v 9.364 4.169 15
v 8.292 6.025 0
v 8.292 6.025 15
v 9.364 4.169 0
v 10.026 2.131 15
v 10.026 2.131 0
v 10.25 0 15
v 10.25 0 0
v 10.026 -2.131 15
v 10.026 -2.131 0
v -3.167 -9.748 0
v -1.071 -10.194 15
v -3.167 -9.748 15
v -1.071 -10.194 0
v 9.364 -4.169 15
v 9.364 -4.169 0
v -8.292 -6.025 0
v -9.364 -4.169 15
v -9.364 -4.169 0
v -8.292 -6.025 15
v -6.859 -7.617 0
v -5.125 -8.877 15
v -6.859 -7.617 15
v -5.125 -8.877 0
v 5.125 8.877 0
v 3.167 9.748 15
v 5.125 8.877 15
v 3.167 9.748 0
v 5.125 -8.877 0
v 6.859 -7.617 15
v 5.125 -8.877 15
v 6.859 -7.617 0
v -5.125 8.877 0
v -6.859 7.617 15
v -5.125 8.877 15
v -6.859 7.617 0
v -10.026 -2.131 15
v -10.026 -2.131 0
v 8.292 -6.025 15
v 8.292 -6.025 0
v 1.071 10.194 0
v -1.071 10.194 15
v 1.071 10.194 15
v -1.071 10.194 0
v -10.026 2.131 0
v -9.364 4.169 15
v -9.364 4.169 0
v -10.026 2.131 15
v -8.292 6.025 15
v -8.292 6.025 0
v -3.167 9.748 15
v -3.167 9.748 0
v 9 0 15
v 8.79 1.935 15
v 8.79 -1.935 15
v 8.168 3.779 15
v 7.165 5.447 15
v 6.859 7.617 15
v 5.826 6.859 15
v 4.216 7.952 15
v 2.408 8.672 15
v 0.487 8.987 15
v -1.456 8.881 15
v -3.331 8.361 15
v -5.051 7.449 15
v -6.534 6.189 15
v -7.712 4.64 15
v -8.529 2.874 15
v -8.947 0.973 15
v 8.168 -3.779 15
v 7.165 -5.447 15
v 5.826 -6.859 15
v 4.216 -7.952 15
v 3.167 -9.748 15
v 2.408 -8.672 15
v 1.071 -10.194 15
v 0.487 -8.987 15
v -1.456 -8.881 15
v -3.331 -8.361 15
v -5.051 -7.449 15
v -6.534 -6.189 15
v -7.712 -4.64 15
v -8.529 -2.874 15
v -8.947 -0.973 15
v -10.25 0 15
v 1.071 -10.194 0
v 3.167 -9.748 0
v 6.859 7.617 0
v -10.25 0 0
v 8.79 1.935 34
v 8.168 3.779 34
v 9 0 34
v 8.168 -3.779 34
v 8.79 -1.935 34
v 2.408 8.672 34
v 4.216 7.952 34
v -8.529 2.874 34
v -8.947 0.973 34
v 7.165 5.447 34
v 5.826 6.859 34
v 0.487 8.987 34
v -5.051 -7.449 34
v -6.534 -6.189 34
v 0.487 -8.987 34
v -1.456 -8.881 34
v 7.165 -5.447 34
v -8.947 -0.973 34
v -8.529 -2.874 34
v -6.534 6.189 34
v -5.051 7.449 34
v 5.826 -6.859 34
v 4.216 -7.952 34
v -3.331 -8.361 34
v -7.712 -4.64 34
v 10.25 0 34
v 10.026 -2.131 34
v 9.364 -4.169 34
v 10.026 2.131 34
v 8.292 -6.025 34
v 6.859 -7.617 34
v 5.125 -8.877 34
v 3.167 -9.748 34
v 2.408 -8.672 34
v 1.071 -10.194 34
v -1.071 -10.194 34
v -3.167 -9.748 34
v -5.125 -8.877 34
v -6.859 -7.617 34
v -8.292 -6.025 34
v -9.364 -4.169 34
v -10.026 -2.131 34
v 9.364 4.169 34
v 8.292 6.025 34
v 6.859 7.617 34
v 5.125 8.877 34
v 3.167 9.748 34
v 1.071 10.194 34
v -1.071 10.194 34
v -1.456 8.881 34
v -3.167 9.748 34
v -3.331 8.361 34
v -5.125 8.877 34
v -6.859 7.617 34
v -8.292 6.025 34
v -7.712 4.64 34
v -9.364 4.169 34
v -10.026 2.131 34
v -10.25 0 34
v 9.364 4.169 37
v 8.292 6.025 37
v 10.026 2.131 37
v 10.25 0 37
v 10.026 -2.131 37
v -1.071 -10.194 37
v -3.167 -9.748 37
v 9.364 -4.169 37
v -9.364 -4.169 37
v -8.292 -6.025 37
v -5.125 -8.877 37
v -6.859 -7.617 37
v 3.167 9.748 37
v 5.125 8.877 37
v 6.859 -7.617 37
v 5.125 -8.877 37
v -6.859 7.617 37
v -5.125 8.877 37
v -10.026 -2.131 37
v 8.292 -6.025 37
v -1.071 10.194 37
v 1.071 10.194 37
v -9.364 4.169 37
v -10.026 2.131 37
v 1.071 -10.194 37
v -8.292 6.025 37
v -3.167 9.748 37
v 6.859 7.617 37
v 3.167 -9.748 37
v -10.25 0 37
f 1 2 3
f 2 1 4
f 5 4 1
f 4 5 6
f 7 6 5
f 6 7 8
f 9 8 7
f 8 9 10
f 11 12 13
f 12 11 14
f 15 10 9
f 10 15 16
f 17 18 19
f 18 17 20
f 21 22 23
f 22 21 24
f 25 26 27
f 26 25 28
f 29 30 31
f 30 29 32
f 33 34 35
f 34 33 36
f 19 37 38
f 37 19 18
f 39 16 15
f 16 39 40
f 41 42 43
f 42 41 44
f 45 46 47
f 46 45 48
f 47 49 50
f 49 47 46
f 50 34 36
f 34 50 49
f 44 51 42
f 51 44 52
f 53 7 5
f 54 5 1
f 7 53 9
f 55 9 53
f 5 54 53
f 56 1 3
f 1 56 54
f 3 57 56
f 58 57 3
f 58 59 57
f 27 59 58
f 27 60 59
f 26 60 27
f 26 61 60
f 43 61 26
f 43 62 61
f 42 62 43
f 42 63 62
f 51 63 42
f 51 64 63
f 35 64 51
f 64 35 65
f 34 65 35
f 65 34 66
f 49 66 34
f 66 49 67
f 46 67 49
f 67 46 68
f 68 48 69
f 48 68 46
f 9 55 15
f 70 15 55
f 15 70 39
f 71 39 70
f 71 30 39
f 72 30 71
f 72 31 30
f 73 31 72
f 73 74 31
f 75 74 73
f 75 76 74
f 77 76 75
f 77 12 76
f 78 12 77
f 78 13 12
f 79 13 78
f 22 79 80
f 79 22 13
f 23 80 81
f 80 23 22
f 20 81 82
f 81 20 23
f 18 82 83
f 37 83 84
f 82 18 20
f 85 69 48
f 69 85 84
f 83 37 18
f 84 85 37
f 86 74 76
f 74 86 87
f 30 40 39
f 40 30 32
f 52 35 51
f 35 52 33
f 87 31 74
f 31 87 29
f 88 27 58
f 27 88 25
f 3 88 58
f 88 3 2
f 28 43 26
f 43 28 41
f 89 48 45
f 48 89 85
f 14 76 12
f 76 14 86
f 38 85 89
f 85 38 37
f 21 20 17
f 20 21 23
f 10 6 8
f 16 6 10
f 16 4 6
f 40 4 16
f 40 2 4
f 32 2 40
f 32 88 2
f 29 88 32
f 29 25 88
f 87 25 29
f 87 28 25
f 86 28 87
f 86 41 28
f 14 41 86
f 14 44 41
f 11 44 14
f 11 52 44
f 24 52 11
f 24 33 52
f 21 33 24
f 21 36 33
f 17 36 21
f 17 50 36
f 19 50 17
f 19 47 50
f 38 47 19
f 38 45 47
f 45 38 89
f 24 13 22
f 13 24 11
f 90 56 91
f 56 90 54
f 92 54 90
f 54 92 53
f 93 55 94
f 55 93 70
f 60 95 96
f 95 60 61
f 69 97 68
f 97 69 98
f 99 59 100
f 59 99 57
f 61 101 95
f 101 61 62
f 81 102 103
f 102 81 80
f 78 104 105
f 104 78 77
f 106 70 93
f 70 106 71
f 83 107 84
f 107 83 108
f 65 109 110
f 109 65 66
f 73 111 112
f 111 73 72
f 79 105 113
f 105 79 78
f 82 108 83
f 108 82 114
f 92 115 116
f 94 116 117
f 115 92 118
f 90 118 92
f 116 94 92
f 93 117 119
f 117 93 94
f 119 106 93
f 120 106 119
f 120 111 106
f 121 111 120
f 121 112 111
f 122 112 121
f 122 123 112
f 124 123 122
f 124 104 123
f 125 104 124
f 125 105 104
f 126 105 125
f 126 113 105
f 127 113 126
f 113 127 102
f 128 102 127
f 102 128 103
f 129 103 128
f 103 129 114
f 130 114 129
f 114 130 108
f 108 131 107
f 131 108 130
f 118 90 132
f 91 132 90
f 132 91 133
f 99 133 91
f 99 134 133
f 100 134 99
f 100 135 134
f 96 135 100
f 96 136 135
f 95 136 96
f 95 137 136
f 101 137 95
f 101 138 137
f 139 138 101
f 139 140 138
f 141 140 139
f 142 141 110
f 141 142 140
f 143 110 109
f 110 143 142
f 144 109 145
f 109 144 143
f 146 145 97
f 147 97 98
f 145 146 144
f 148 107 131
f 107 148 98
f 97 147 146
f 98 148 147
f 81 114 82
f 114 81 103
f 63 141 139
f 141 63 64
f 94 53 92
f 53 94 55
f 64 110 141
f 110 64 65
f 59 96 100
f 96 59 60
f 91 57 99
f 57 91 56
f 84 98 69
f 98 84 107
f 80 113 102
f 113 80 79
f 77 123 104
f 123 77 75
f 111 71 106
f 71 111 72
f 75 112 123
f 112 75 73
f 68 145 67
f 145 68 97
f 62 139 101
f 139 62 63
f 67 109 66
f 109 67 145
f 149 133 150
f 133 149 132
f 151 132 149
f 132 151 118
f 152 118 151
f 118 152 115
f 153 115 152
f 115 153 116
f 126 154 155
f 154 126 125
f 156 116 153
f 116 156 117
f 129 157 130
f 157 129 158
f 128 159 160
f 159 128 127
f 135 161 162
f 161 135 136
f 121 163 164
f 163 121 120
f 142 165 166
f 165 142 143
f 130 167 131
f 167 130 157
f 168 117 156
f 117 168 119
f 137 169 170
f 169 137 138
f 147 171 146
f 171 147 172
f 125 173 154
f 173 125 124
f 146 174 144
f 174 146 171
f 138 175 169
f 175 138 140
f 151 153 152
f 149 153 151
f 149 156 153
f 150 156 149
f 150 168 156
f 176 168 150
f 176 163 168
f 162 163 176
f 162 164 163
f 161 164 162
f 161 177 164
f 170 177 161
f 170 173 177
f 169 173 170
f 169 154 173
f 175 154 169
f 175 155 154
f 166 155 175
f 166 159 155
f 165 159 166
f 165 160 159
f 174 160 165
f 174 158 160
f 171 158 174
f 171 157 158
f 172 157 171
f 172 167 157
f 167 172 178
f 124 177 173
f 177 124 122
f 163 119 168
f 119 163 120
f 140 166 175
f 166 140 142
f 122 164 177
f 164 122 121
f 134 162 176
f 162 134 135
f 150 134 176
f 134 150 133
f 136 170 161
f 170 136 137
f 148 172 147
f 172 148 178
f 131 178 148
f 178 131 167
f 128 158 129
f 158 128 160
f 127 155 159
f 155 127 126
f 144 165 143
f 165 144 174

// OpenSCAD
// this is the long spool from steve graber

spool();

h= 37;
sh= 19;
bh= 15;
th= 3;
dia= 18;
odia= 20.5;

module spool() {
	cylinder(r= odia/2, h=bh);
	translate([0,0,bh]) cylinder(r=dia/2, h=sh);
	translate([0,0,bh+sh]) cylinder(r=odia/2, h=th);
}
